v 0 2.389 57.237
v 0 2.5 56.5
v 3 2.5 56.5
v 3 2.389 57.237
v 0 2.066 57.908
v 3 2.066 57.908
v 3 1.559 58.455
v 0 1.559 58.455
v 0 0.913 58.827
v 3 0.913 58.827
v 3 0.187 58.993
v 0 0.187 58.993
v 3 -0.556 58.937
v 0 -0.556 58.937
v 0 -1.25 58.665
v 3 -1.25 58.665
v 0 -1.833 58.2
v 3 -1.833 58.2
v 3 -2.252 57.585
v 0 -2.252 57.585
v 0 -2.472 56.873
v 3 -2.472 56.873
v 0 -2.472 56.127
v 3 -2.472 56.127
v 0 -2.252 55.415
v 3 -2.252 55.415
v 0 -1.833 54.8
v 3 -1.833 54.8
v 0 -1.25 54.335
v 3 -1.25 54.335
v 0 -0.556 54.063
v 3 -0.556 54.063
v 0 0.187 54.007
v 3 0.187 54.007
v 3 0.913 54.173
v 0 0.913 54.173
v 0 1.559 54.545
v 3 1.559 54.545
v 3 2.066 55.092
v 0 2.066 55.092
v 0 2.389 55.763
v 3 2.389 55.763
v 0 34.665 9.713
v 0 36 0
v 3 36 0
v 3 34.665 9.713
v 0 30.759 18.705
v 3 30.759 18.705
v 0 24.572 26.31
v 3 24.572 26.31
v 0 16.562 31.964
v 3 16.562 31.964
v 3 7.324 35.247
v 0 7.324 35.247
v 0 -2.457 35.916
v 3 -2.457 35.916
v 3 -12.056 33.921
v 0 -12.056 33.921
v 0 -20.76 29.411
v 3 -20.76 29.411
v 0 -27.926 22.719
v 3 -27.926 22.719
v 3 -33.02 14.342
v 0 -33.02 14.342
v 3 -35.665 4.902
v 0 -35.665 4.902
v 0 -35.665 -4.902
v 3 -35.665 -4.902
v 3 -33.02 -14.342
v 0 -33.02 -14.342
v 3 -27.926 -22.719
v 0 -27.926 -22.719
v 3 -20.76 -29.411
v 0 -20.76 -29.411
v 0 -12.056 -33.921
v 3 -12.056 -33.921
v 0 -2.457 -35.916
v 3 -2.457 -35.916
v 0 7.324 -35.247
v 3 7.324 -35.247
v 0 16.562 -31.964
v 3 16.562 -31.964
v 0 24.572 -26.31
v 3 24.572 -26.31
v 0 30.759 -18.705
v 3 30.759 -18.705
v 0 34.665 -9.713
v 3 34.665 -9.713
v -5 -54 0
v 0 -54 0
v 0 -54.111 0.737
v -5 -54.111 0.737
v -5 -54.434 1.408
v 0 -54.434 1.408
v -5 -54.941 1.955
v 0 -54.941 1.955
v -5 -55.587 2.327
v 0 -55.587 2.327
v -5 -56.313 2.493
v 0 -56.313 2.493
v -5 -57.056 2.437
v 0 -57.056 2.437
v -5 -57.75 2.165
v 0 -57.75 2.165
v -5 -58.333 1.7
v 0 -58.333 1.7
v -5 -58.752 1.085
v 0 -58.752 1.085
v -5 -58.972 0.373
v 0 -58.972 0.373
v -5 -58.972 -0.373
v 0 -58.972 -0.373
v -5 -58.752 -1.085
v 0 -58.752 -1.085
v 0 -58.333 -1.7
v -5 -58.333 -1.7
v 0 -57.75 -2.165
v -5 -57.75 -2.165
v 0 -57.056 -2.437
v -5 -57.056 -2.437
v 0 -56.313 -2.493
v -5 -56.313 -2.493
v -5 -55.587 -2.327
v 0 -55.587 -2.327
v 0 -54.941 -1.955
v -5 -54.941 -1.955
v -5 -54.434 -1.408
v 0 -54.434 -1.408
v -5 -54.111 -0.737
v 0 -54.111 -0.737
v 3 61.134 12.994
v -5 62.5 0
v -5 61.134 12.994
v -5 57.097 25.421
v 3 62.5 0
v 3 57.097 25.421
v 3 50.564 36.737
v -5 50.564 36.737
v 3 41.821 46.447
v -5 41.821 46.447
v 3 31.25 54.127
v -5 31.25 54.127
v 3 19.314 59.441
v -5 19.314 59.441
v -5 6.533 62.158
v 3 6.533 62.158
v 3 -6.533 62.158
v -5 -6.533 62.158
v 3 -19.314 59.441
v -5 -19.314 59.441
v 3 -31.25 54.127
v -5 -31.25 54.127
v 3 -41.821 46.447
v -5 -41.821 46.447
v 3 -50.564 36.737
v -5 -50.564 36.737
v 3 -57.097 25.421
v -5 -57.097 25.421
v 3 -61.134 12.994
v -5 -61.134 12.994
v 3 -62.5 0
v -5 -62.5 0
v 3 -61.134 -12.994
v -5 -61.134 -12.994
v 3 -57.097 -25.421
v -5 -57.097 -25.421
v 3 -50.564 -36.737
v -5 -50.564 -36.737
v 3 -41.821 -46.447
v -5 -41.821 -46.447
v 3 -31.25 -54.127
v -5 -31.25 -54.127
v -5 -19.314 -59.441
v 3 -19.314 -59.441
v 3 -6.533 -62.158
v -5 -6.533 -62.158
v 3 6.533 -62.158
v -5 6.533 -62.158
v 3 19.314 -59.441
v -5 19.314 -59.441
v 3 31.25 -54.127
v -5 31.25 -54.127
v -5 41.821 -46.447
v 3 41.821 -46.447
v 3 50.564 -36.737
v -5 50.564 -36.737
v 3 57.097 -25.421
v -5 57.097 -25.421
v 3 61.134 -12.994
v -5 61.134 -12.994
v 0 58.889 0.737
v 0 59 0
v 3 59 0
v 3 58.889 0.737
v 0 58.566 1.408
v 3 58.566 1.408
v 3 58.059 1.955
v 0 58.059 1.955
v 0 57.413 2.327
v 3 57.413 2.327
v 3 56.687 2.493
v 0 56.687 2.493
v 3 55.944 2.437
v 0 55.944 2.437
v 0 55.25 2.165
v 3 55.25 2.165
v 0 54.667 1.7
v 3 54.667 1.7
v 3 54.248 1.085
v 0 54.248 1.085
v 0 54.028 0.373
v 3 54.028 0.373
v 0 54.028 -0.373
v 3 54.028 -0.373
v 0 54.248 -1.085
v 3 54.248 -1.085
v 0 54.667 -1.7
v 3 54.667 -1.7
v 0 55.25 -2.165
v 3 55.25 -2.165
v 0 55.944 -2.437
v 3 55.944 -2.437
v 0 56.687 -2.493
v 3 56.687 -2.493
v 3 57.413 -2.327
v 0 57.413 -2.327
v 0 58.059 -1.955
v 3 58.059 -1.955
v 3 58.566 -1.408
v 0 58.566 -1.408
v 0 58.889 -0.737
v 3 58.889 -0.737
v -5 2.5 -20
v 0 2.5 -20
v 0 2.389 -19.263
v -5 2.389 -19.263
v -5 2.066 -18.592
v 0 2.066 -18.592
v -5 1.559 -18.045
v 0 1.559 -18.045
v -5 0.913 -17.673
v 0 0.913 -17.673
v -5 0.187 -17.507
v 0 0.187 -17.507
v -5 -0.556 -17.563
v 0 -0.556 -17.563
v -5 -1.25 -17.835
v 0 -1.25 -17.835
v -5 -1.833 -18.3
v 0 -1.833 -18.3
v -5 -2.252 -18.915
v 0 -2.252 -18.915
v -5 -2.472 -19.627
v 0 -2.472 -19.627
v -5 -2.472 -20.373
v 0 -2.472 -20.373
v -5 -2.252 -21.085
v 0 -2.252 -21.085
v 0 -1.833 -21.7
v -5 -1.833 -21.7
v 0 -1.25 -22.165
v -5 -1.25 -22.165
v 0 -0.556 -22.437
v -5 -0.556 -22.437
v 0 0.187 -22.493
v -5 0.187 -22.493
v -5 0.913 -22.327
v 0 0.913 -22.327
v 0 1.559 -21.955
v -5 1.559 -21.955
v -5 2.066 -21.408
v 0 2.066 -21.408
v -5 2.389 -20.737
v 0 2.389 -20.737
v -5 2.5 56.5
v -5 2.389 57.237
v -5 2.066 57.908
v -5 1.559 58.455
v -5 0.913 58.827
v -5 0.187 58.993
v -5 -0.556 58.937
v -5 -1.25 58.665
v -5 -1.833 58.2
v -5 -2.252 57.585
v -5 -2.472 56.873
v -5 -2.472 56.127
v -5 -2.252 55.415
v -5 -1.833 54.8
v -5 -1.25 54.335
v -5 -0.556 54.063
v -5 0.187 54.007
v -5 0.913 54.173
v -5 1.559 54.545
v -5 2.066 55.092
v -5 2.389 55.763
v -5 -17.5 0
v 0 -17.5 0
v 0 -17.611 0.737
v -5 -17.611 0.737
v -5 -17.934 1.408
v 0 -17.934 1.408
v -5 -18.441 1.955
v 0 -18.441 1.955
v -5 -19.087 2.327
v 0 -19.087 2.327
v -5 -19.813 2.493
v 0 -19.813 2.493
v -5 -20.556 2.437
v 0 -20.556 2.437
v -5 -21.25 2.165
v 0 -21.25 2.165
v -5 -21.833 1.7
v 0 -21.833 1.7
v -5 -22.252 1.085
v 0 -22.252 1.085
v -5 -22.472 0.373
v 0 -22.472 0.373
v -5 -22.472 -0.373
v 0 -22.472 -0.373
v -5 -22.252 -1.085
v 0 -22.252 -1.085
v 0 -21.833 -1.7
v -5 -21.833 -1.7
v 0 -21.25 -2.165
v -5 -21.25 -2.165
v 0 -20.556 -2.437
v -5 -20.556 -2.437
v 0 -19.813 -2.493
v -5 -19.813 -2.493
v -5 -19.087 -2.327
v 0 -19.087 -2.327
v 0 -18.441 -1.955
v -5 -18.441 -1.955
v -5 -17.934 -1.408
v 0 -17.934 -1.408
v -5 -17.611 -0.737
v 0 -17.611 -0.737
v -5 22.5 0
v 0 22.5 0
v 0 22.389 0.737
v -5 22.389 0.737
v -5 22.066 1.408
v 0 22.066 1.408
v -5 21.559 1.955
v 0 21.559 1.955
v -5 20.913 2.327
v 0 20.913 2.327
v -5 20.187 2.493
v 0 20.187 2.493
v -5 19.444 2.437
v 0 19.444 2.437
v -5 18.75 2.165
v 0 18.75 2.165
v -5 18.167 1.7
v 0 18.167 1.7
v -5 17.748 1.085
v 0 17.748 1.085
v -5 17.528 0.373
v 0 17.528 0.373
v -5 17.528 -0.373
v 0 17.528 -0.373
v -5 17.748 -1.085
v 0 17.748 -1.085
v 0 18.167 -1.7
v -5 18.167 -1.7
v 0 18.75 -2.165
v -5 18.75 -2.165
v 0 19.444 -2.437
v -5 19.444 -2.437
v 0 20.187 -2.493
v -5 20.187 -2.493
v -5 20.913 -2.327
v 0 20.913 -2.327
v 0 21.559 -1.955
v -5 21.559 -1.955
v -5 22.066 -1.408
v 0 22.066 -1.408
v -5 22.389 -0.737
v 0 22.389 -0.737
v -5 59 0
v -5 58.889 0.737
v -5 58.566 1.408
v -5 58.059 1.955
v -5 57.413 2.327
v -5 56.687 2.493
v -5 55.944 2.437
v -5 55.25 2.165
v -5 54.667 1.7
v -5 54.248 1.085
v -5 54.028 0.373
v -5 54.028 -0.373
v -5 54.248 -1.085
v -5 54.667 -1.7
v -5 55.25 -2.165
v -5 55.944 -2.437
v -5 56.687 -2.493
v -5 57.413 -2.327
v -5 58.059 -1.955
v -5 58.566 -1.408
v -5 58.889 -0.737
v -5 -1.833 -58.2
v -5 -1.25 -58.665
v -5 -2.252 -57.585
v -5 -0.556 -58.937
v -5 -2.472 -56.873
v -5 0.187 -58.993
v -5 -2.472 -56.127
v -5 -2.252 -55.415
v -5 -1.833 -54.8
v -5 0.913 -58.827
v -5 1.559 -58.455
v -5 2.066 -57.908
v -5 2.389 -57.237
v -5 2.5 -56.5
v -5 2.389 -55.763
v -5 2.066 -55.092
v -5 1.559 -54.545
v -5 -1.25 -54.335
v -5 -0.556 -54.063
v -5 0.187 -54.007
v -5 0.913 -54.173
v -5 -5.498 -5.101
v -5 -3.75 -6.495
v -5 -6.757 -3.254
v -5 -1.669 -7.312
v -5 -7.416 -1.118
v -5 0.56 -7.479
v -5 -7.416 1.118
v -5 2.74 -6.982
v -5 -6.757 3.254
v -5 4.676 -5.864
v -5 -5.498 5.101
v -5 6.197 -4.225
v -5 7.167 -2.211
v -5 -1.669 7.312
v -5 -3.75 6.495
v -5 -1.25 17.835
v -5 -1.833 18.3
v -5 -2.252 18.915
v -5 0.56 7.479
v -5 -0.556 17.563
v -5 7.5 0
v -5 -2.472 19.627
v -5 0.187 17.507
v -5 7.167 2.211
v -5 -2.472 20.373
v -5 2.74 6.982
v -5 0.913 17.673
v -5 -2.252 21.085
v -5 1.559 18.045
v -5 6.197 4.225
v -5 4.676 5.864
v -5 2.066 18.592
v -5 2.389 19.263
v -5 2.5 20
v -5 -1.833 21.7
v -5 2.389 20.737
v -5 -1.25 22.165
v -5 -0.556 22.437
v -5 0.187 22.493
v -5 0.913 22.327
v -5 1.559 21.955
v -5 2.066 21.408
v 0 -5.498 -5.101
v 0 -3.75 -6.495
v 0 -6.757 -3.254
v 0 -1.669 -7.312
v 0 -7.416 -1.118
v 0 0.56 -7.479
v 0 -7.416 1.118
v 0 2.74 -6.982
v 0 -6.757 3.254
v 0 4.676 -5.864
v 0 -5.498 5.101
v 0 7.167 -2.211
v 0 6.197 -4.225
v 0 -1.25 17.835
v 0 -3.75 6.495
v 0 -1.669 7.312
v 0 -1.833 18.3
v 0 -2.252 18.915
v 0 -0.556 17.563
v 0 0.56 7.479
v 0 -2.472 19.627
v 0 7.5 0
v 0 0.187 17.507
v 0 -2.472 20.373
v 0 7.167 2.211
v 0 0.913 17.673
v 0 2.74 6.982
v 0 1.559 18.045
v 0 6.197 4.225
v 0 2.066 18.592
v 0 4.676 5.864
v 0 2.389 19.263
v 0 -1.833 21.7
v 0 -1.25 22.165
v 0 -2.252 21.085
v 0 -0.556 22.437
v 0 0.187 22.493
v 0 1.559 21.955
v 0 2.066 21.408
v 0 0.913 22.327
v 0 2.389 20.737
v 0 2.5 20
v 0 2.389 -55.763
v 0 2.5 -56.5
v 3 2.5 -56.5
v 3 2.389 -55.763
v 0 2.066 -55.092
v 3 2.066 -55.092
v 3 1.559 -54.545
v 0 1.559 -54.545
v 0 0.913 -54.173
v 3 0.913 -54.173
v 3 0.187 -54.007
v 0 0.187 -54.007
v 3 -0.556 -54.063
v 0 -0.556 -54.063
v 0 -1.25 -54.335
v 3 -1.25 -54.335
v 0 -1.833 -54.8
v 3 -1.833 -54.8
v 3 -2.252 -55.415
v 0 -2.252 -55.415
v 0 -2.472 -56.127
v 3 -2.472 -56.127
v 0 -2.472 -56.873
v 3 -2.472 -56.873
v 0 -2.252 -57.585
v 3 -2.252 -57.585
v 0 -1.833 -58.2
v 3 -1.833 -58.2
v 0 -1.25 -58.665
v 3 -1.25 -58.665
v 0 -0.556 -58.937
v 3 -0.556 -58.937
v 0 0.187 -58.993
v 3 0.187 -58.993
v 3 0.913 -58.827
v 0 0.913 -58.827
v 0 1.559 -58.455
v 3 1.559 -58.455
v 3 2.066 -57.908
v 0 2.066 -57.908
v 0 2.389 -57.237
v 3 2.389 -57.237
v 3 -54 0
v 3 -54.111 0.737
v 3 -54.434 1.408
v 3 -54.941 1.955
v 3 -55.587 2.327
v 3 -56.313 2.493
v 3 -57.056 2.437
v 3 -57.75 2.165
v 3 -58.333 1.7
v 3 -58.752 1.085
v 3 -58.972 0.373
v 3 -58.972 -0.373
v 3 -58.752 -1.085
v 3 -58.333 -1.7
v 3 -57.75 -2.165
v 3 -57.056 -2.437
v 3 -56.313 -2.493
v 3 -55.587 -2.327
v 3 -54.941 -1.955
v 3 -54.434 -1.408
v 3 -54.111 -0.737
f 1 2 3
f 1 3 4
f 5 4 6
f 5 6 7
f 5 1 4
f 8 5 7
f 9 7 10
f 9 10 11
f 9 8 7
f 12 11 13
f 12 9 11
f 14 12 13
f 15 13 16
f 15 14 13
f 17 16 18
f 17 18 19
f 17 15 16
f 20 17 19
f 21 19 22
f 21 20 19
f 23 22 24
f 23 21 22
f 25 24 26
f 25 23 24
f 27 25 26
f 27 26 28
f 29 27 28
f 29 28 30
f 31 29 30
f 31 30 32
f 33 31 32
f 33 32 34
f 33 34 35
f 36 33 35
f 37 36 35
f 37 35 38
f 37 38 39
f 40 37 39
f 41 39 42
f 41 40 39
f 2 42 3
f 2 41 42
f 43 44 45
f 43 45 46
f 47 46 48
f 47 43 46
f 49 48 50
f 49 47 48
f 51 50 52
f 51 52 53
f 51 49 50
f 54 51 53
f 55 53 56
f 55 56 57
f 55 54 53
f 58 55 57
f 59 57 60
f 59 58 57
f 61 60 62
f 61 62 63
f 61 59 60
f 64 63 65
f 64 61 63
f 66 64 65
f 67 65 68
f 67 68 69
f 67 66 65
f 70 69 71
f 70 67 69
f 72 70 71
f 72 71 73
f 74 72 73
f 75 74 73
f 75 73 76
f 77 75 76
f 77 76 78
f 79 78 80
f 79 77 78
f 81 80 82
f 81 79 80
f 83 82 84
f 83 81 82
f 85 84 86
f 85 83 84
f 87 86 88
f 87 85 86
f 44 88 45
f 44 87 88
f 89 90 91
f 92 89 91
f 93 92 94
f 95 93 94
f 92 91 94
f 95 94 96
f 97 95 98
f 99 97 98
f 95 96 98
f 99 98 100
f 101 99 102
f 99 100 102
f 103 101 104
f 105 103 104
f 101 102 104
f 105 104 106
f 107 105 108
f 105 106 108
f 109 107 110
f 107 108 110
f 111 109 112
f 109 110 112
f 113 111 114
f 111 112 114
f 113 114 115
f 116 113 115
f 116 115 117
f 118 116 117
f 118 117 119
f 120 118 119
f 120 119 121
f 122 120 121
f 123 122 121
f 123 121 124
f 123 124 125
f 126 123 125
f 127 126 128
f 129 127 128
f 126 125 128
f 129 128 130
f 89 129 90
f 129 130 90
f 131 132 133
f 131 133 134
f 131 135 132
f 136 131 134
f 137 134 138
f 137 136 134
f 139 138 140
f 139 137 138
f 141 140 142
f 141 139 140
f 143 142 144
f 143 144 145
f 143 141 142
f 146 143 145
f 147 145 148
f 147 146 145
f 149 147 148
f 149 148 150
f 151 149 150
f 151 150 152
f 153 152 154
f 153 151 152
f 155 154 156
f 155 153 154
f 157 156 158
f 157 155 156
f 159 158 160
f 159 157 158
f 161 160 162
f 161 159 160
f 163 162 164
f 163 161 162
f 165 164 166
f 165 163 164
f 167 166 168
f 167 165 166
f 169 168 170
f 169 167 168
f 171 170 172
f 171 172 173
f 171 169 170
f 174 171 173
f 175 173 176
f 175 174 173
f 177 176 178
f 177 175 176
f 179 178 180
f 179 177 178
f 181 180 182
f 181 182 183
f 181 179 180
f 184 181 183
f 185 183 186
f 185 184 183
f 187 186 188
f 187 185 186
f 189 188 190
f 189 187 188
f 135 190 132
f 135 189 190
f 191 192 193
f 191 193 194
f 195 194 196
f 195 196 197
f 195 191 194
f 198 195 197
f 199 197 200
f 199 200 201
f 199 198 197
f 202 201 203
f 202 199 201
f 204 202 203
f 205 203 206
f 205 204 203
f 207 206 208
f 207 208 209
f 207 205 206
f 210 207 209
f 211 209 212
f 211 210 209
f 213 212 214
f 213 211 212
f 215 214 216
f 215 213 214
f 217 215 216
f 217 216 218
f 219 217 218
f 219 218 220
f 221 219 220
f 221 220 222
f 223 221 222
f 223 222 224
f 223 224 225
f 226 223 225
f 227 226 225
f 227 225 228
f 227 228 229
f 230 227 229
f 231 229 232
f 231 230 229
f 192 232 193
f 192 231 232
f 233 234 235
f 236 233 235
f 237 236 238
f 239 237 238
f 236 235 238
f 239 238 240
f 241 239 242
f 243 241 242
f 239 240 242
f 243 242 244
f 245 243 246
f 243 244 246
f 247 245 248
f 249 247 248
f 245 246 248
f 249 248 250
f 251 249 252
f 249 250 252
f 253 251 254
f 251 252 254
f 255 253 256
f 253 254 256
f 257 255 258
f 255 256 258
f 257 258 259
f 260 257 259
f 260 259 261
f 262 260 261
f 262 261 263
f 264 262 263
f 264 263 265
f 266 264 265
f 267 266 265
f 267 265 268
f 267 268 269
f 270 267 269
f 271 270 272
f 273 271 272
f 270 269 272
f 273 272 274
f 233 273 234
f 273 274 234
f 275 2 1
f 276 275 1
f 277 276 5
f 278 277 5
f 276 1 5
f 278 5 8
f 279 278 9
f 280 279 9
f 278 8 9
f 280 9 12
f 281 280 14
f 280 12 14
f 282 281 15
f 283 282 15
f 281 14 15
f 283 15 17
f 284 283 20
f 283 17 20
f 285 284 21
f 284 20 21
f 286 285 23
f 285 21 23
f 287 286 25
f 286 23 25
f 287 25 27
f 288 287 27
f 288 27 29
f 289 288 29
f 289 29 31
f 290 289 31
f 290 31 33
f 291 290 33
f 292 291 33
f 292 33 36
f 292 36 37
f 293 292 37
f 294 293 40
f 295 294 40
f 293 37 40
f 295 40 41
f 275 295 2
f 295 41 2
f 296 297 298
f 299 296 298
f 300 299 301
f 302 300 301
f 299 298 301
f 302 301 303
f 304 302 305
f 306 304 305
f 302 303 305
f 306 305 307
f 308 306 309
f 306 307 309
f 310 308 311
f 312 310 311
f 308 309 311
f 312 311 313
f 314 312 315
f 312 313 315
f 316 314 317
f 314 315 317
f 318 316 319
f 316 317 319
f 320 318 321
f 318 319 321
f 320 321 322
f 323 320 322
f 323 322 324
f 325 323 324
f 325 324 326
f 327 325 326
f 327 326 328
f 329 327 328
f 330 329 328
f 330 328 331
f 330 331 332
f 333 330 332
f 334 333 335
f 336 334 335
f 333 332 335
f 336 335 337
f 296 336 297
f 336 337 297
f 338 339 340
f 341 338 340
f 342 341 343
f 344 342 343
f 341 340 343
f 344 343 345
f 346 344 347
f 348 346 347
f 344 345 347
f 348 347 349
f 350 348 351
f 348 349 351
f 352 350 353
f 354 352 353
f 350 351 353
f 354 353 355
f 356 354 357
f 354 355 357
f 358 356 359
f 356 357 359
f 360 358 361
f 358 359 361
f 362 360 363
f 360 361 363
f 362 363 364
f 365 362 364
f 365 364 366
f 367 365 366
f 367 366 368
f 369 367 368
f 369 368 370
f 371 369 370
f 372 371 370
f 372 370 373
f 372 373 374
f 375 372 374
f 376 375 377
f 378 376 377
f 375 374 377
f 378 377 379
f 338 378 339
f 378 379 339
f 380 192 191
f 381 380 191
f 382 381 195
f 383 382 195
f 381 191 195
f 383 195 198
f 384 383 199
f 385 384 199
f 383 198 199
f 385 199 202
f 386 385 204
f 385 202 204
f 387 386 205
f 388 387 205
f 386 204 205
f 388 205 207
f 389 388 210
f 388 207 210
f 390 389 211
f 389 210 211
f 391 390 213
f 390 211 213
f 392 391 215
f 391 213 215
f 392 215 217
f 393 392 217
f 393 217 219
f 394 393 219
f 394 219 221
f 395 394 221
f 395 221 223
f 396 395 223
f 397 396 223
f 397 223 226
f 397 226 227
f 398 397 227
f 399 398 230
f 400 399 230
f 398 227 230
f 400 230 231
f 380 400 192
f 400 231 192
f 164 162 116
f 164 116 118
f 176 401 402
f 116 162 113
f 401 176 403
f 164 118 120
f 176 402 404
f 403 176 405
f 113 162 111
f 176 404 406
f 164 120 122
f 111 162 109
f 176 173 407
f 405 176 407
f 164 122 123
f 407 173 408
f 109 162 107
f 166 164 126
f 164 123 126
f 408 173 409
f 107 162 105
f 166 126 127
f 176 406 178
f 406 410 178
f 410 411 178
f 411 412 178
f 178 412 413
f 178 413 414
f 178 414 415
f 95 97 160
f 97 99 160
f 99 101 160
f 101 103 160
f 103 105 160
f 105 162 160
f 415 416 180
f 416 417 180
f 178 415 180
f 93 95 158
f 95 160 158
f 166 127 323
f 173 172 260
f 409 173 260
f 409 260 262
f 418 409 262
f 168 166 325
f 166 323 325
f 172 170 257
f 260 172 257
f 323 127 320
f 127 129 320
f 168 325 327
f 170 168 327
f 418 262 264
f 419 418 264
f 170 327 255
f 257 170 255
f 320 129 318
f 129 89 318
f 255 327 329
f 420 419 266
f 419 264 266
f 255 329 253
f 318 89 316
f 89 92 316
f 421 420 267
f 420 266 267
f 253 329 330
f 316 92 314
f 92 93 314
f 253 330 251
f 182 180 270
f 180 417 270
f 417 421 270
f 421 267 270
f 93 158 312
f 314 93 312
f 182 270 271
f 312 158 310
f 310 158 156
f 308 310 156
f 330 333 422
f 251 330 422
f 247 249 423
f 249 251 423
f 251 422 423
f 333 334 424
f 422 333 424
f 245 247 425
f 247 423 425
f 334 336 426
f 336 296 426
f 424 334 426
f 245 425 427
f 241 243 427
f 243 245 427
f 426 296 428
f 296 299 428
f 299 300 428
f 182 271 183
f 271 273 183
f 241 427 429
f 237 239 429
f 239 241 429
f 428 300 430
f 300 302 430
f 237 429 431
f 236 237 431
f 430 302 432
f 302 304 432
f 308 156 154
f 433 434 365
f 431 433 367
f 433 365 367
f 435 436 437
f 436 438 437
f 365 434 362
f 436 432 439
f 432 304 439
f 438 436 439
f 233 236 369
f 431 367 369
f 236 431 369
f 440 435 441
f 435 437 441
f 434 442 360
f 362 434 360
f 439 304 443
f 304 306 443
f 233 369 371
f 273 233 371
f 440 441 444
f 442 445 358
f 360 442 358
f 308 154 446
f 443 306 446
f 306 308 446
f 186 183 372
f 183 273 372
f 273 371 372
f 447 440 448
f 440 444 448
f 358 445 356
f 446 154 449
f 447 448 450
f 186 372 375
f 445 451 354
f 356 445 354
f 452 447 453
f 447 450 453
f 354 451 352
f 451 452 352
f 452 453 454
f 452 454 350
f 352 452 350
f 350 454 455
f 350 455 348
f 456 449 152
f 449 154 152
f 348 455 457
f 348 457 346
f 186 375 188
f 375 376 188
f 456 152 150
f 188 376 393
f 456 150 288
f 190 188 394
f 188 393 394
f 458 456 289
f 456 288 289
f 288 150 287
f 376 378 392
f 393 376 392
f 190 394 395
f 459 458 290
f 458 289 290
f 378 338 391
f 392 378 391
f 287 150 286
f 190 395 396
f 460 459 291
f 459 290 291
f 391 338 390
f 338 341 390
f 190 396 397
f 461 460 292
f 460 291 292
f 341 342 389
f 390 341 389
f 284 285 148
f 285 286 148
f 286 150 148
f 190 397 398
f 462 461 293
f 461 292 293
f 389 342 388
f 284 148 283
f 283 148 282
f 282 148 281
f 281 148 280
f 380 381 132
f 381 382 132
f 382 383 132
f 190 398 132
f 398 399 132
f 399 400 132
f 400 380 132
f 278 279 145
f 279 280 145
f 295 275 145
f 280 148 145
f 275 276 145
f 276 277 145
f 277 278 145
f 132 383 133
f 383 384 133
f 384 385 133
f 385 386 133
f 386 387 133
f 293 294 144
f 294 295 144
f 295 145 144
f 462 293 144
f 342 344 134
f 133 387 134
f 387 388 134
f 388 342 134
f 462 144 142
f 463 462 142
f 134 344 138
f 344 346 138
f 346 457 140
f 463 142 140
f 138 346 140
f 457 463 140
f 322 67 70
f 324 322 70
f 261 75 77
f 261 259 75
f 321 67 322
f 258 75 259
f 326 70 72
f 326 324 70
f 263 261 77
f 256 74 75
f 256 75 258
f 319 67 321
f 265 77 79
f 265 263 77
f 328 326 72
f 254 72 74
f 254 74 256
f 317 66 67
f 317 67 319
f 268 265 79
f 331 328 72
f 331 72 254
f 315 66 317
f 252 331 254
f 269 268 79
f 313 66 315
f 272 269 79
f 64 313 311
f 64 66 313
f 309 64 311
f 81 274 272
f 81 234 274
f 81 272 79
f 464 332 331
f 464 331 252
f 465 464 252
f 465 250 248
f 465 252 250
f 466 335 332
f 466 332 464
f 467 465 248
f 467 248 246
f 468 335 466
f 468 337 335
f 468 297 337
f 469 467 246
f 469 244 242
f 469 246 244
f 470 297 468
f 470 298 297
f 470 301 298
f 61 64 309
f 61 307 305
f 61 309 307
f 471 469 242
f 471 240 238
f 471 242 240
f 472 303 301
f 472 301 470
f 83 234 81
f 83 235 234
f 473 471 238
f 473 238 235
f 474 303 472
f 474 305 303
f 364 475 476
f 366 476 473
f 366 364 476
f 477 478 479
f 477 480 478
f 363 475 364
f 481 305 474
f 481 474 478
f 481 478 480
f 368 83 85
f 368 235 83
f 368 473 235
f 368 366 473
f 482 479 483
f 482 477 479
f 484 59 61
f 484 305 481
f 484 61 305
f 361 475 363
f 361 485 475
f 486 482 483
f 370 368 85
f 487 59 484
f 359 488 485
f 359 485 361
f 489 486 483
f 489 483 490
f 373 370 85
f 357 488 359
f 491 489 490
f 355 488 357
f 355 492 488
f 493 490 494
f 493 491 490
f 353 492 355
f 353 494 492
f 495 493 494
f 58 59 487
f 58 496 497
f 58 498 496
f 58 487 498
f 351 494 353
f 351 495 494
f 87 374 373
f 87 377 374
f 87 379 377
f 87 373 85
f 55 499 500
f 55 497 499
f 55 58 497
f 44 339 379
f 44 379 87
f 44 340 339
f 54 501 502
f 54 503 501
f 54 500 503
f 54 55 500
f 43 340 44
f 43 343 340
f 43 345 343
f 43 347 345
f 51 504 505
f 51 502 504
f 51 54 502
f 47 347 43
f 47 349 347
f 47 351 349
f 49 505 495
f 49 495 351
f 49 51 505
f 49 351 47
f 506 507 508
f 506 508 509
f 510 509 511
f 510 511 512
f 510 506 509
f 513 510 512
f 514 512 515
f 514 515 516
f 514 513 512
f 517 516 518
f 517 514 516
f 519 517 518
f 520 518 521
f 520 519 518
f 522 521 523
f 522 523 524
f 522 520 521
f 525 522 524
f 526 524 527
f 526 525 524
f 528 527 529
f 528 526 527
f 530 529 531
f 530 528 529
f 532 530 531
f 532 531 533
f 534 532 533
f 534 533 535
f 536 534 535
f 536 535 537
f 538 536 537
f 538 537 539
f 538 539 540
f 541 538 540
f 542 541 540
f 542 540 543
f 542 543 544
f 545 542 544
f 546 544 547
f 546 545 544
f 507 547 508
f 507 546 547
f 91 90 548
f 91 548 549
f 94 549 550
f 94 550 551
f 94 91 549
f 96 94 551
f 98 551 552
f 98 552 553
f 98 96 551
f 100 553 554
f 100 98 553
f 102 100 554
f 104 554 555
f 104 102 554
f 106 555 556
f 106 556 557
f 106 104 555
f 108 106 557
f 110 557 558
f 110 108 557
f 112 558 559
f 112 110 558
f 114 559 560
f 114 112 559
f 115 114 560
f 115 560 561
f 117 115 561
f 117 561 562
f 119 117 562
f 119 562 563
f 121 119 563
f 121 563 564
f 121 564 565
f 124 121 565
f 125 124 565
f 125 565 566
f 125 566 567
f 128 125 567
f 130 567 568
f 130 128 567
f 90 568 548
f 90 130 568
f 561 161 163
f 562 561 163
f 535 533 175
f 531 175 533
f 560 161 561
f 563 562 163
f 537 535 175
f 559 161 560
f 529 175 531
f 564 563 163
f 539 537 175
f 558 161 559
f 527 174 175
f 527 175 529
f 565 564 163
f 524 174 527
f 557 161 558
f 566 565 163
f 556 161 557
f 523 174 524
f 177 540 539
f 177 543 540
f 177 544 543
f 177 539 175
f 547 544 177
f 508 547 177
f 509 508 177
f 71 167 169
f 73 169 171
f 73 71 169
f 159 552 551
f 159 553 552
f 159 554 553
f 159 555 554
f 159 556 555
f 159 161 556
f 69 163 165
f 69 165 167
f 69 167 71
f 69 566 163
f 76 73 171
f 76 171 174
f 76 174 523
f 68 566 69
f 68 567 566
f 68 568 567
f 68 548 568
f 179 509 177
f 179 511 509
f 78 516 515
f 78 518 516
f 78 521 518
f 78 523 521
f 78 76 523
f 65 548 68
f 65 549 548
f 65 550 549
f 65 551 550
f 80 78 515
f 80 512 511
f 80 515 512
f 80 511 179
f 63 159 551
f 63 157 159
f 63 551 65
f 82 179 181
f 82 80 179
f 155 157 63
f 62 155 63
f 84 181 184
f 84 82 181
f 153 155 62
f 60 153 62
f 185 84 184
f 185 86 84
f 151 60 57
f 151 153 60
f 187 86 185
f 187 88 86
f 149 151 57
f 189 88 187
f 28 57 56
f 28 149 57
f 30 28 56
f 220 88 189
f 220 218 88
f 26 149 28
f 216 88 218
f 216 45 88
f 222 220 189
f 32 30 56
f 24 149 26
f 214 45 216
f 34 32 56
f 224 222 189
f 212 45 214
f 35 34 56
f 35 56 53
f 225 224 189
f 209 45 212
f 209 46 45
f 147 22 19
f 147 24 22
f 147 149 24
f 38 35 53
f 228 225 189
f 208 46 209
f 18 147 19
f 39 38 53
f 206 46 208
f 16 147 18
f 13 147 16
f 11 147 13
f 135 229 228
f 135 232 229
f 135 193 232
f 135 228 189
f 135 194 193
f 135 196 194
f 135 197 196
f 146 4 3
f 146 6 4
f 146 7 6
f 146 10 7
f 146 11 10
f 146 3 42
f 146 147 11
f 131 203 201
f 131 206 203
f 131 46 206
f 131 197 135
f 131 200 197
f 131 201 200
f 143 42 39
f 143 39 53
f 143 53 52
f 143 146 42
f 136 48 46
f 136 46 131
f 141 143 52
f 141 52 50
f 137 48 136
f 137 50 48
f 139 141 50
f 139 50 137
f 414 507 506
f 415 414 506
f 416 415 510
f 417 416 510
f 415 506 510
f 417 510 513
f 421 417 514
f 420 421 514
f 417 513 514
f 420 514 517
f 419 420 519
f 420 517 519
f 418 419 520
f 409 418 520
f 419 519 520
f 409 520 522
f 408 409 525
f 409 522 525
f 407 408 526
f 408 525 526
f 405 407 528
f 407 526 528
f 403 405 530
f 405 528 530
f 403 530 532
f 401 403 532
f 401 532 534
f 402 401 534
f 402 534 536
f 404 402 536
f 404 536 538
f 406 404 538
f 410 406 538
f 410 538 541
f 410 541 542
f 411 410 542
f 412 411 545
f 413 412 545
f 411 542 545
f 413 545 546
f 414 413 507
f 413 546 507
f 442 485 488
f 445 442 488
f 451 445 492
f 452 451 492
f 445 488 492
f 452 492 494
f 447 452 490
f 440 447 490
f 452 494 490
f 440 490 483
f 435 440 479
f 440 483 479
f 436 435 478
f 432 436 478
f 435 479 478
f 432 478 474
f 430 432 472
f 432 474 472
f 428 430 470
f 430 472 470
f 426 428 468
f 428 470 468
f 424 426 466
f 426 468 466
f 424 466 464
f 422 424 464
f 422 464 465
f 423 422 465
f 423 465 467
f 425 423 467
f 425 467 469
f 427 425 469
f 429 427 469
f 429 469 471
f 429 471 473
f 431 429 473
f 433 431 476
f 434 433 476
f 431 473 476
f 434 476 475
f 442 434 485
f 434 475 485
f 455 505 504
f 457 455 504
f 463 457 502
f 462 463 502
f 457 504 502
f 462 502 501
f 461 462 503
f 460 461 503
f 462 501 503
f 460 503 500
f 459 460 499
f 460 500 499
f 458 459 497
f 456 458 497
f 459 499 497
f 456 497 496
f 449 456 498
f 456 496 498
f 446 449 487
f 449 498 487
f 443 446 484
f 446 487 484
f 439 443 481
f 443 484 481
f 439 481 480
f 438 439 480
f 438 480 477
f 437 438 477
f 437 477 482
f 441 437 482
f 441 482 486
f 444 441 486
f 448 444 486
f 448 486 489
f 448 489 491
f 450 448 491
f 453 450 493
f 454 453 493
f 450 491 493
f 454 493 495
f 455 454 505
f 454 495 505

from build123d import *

# Parameters (mm, degrees)
F0_R     = 62.5
F0_R_2   = 2.5
F0_R_3   = 36
F1_DEPTH = 3
F0_R_4   = 7.5
F2_DEPTH = 5


with BuildPart() as f1:
    # F0 (on Right) → F1 (new body)
    with BuildSketch(Plane.YZ):
        Circle(F0_R)
        with Locations((0, -56.5)):
            Circle(F0_R_2, mode=Mode.SUBTRACT)
        with Locations((-56.5, 0)):
            Circle(F0_R_2, mode=Mode.SUBTRACT)
        Circle(F0_R_3, mode=Mode.SUBTRACT)
        with Locations((56.5, 0)):
            Circle(F0_R_2, mode=Mode.SUBTRACT)
        with Locations((0, 56.5)):
            Circle(F0_R_2, mode=Mode.SUBTRACT)
    extrude(amount=F1_DEPTH)

    # F0 (on Right) → F2 (join)
    with BuildSketch(Plane.YZ):
        Circle(F0_R)
        with Locations((0, -56.5)):
            Circle(F0_R_2, mode=Mode.SUBTRACT)
        with Locations((-56.5, 0)):
            Circle(F0_R_2, mode=Mode.SUBTRACT)
        Circle(F0_R_3, mode=Mode.SUBTRACT)
        with Locations((56.5, 0)):
            Circle(F0_R_2, mode=Mode.SUBTRACT)
        with Locations((0, 56.5)):
            Circle(F0_R_2, mode=Mode.SUBTRACT)
        Circle(F0_R_3)
        with Locations((0, -20)):
            Circle(F0_R_2, mode=Mode.SUBTRACT)
        with Locations((-20, 0)):
            Circle(F0_R_2, mode=Mode.SUBTRACT)
        Circle(F0_R_4, mode=Mode.SUBTRACT)
        with Locations((20, 0)):
            Circle(F0_R_2, mode=Mode.SUBTRACT)
        with Locations((0, 20)):
            Circle(F0_R_2, mode=Mode.SUBTRACT)
    extrude(amount=-F2_DEPTH)


solid = f1.part
